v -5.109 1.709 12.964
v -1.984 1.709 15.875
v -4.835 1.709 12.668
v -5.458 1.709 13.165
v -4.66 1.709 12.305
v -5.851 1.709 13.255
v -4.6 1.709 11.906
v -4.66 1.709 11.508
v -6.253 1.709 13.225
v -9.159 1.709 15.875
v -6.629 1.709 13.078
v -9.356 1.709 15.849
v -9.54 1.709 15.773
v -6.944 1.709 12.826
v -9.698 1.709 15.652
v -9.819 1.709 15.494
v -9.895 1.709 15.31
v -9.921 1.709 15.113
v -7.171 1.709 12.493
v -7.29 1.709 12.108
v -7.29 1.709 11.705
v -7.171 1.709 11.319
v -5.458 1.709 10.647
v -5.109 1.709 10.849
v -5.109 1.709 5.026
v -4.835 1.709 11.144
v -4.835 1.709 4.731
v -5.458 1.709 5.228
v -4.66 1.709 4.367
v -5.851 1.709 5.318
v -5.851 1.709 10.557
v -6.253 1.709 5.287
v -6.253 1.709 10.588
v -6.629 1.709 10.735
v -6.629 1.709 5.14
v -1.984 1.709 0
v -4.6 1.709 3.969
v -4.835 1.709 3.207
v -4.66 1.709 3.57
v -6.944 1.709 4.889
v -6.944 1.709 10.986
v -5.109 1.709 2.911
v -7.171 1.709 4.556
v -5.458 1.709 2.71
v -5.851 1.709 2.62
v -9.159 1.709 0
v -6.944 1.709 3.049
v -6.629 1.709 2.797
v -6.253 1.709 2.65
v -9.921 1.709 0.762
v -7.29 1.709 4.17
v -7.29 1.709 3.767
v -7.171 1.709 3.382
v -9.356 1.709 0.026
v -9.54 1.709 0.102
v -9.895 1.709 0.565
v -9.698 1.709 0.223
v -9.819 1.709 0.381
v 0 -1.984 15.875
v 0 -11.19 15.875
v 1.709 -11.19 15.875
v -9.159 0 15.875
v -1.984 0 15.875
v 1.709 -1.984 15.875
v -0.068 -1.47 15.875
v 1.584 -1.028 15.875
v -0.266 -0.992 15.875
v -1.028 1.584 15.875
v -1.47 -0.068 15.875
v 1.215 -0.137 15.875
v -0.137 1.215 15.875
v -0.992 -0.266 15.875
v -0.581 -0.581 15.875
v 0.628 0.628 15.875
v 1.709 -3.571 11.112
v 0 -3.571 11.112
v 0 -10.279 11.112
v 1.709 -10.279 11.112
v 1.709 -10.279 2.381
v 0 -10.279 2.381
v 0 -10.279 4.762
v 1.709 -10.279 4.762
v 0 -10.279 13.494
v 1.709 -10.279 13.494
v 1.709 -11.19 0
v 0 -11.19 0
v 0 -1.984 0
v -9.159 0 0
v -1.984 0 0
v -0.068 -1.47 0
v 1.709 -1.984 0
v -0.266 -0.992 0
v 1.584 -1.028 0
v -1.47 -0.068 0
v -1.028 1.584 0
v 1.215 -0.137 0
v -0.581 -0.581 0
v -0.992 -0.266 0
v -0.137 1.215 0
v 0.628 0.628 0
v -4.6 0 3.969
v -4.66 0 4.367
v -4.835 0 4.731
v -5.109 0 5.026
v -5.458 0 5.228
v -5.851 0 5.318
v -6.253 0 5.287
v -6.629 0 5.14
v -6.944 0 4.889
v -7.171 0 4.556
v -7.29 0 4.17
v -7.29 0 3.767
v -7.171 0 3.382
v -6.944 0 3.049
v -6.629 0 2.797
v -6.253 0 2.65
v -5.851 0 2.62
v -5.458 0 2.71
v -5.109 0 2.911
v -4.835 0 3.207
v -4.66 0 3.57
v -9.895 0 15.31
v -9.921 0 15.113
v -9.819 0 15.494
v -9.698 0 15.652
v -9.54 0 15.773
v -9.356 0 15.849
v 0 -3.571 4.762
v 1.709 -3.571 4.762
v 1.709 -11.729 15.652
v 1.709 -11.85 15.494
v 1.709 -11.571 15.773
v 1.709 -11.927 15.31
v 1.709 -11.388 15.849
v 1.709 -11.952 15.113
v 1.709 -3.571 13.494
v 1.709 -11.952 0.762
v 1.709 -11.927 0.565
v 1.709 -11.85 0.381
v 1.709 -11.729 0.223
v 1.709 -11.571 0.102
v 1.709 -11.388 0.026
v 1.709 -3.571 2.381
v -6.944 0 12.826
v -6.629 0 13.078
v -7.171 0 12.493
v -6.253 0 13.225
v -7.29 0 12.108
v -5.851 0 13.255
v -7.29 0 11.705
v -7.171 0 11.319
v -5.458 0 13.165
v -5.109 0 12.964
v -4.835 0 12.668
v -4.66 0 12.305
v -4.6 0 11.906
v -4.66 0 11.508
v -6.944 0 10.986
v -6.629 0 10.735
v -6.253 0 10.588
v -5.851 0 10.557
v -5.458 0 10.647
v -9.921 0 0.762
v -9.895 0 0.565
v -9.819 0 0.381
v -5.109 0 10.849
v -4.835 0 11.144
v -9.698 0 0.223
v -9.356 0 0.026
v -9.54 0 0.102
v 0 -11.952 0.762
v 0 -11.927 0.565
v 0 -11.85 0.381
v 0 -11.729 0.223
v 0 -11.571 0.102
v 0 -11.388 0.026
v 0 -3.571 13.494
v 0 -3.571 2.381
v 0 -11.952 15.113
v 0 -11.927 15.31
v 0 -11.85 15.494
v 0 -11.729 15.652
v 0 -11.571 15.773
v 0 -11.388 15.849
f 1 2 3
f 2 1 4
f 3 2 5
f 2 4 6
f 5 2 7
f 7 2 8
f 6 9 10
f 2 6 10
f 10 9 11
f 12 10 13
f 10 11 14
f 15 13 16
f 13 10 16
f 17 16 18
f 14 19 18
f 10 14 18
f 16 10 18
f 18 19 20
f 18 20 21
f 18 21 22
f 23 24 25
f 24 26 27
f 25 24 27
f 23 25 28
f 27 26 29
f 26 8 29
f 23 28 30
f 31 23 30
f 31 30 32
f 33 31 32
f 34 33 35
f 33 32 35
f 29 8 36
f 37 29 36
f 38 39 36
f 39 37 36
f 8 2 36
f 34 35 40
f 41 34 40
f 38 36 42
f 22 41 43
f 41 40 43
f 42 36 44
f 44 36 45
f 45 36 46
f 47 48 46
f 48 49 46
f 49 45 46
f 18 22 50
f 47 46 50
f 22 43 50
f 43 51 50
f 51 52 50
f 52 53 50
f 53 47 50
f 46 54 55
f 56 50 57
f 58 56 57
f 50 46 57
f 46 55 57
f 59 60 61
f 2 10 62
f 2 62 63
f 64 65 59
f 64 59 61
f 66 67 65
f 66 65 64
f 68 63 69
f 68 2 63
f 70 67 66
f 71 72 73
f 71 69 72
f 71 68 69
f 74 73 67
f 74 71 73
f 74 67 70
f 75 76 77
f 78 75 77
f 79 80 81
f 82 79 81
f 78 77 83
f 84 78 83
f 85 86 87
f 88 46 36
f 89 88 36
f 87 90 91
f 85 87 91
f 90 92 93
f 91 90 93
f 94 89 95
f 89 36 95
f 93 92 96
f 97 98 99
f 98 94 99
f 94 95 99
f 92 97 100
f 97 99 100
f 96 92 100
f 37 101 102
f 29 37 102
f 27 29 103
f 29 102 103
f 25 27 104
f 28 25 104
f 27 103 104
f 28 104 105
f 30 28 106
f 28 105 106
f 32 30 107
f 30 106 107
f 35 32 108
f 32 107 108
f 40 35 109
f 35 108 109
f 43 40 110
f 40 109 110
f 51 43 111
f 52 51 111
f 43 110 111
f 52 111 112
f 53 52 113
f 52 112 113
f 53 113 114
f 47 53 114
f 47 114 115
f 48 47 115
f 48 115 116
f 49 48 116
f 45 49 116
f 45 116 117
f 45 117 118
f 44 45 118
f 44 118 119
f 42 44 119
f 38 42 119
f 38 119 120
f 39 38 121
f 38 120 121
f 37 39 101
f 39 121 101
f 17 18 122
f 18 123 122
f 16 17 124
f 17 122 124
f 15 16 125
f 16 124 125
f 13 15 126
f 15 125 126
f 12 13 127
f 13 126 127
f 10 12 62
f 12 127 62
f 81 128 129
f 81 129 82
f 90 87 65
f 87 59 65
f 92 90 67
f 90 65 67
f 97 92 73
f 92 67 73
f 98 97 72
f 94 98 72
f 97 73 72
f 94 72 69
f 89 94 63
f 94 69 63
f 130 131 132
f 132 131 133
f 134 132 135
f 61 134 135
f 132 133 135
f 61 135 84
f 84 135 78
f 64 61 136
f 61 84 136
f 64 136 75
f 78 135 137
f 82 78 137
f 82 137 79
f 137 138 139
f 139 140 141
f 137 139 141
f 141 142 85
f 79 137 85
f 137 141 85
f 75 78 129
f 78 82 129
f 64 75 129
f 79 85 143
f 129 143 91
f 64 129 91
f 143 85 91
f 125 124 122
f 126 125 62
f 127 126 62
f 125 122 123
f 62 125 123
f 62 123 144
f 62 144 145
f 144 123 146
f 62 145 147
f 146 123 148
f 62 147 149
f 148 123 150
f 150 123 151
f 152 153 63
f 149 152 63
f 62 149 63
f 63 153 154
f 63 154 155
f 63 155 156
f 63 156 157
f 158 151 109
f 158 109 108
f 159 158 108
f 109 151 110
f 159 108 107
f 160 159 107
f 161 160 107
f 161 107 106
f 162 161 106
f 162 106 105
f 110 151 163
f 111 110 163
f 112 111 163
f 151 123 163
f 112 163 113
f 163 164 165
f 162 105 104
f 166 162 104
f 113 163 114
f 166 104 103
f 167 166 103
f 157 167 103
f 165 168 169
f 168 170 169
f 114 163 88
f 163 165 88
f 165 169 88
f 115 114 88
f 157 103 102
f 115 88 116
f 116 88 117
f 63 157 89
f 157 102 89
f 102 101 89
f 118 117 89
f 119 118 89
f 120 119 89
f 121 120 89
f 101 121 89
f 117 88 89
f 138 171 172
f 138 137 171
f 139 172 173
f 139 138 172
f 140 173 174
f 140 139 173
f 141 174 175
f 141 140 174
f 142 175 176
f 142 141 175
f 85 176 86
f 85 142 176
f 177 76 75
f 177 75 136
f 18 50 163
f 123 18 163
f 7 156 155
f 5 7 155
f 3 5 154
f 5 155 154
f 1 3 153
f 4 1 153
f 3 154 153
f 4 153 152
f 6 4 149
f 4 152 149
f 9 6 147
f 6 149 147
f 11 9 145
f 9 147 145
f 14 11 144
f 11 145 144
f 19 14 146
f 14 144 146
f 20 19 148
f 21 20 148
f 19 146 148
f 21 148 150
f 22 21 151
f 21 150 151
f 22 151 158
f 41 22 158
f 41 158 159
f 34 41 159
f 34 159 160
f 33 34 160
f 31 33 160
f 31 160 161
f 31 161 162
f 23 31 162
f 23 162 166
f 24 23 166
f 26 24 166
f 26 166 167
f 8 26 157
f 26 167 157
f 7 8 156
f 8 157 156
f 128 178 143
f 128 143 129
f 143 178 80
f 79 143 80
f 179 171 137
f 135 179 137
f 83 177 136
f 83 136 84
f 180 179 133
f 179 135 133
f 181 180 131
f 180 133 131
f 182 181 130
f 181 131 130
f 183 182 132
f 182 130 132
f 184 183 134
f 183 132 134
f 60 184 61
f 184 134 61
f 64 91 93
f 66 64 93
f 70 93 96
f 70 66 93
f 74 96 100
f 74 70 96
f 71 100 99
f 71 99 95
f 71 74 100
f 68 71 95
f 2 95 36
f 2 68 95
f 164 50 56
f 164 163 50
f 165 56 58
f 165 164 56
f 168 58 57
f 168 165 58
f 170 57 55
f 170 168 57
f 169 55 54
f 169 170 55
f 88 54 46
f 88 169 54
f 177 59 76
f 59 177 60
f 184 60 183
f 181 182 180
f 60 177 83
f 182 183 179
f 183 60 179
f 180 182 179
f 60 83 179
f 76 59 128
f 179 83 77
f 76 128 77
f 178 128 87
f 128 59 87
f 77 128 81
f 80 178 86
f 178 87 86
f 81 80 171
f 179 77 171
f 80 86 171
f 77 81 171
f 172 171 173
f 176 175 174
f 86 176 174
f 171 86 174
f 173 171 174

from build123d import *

# Parameters (mm, degrees)
F1_DEPTH = 15.875
F2_R     = 0.762
F3_R     = 1.98374
F4_R     = 3.69316
F5_W     = 6.707656
F5_H     = 2.38125
F6_DEPTH = 1.70942
F7_R     = 1.35255
F8_DEPTH = 1.70942


with BuildPart() as f1:
    # F0 (on Top) → F1 (new body)
    with BuildSketch(Plane.XY):
        Polygon((0, 0), (0, -11.952478), (1.70942, -11.952478), (1.70942, 1.70942), (-9.92124, 1.70942), (-9.92124, 0), align=None)
    extrude(amount=F1_DEPTH)

    # F2
    f2_edges = [f1.edges().sort_by_distance(p)[0] for p in [
        (-9.92124, 0.85471, 15.875),
        (-9.92124, 0.85471, 0),
        (0.85471, -11.952478, 0),
        (0.85471, -11.952478, 15.875),
    ]]
    fillet(f2_edges, radius=F2_R)

    # F3
    f3_edges = [f1.edges().sort_by_distance(p)[0] for p in [
        (0, 0, 7.9375),
    ]]
    fillet(f3_edges, radius=F3_R)

    # F4
    f4_edges = [f1.edges().sort_by_distance(p)[0] for p in [
        (1.70942, 1.70942, 7.9375),
    ]]
    fillet(f4_edges, radius=F4_R)

    # F5 (on face) → F6 (cut, through all)
    with BuildSketch(Plane(origin=(0, 0, 0), x_dir=(0, -1, 0), z_dir=(-1, 0, 0))):
        with Locations((6.925068, 12.303125)):
            Rectangle(F5_W, F5_H)
        with Locations((6.925068, 3.571875)):
            Rectangle(F5_W, F5_H)
    extrude(amount=-F6_DEPTH, mode=Mode.SUBTRACT)

    # F7 (on face) → F8 (cut, through all)
    with BuildSketch(Plane.XZ):
        with Locations((-5.95249, 11.90625)):
            Circle(F7_R)
        with Locations((-5.95249, 3.96875)):
            Circle(F7_R)
    extrude(amount=-F8_DEPTH, mode=Mode.SUBTRACT)


solid = f1.part
